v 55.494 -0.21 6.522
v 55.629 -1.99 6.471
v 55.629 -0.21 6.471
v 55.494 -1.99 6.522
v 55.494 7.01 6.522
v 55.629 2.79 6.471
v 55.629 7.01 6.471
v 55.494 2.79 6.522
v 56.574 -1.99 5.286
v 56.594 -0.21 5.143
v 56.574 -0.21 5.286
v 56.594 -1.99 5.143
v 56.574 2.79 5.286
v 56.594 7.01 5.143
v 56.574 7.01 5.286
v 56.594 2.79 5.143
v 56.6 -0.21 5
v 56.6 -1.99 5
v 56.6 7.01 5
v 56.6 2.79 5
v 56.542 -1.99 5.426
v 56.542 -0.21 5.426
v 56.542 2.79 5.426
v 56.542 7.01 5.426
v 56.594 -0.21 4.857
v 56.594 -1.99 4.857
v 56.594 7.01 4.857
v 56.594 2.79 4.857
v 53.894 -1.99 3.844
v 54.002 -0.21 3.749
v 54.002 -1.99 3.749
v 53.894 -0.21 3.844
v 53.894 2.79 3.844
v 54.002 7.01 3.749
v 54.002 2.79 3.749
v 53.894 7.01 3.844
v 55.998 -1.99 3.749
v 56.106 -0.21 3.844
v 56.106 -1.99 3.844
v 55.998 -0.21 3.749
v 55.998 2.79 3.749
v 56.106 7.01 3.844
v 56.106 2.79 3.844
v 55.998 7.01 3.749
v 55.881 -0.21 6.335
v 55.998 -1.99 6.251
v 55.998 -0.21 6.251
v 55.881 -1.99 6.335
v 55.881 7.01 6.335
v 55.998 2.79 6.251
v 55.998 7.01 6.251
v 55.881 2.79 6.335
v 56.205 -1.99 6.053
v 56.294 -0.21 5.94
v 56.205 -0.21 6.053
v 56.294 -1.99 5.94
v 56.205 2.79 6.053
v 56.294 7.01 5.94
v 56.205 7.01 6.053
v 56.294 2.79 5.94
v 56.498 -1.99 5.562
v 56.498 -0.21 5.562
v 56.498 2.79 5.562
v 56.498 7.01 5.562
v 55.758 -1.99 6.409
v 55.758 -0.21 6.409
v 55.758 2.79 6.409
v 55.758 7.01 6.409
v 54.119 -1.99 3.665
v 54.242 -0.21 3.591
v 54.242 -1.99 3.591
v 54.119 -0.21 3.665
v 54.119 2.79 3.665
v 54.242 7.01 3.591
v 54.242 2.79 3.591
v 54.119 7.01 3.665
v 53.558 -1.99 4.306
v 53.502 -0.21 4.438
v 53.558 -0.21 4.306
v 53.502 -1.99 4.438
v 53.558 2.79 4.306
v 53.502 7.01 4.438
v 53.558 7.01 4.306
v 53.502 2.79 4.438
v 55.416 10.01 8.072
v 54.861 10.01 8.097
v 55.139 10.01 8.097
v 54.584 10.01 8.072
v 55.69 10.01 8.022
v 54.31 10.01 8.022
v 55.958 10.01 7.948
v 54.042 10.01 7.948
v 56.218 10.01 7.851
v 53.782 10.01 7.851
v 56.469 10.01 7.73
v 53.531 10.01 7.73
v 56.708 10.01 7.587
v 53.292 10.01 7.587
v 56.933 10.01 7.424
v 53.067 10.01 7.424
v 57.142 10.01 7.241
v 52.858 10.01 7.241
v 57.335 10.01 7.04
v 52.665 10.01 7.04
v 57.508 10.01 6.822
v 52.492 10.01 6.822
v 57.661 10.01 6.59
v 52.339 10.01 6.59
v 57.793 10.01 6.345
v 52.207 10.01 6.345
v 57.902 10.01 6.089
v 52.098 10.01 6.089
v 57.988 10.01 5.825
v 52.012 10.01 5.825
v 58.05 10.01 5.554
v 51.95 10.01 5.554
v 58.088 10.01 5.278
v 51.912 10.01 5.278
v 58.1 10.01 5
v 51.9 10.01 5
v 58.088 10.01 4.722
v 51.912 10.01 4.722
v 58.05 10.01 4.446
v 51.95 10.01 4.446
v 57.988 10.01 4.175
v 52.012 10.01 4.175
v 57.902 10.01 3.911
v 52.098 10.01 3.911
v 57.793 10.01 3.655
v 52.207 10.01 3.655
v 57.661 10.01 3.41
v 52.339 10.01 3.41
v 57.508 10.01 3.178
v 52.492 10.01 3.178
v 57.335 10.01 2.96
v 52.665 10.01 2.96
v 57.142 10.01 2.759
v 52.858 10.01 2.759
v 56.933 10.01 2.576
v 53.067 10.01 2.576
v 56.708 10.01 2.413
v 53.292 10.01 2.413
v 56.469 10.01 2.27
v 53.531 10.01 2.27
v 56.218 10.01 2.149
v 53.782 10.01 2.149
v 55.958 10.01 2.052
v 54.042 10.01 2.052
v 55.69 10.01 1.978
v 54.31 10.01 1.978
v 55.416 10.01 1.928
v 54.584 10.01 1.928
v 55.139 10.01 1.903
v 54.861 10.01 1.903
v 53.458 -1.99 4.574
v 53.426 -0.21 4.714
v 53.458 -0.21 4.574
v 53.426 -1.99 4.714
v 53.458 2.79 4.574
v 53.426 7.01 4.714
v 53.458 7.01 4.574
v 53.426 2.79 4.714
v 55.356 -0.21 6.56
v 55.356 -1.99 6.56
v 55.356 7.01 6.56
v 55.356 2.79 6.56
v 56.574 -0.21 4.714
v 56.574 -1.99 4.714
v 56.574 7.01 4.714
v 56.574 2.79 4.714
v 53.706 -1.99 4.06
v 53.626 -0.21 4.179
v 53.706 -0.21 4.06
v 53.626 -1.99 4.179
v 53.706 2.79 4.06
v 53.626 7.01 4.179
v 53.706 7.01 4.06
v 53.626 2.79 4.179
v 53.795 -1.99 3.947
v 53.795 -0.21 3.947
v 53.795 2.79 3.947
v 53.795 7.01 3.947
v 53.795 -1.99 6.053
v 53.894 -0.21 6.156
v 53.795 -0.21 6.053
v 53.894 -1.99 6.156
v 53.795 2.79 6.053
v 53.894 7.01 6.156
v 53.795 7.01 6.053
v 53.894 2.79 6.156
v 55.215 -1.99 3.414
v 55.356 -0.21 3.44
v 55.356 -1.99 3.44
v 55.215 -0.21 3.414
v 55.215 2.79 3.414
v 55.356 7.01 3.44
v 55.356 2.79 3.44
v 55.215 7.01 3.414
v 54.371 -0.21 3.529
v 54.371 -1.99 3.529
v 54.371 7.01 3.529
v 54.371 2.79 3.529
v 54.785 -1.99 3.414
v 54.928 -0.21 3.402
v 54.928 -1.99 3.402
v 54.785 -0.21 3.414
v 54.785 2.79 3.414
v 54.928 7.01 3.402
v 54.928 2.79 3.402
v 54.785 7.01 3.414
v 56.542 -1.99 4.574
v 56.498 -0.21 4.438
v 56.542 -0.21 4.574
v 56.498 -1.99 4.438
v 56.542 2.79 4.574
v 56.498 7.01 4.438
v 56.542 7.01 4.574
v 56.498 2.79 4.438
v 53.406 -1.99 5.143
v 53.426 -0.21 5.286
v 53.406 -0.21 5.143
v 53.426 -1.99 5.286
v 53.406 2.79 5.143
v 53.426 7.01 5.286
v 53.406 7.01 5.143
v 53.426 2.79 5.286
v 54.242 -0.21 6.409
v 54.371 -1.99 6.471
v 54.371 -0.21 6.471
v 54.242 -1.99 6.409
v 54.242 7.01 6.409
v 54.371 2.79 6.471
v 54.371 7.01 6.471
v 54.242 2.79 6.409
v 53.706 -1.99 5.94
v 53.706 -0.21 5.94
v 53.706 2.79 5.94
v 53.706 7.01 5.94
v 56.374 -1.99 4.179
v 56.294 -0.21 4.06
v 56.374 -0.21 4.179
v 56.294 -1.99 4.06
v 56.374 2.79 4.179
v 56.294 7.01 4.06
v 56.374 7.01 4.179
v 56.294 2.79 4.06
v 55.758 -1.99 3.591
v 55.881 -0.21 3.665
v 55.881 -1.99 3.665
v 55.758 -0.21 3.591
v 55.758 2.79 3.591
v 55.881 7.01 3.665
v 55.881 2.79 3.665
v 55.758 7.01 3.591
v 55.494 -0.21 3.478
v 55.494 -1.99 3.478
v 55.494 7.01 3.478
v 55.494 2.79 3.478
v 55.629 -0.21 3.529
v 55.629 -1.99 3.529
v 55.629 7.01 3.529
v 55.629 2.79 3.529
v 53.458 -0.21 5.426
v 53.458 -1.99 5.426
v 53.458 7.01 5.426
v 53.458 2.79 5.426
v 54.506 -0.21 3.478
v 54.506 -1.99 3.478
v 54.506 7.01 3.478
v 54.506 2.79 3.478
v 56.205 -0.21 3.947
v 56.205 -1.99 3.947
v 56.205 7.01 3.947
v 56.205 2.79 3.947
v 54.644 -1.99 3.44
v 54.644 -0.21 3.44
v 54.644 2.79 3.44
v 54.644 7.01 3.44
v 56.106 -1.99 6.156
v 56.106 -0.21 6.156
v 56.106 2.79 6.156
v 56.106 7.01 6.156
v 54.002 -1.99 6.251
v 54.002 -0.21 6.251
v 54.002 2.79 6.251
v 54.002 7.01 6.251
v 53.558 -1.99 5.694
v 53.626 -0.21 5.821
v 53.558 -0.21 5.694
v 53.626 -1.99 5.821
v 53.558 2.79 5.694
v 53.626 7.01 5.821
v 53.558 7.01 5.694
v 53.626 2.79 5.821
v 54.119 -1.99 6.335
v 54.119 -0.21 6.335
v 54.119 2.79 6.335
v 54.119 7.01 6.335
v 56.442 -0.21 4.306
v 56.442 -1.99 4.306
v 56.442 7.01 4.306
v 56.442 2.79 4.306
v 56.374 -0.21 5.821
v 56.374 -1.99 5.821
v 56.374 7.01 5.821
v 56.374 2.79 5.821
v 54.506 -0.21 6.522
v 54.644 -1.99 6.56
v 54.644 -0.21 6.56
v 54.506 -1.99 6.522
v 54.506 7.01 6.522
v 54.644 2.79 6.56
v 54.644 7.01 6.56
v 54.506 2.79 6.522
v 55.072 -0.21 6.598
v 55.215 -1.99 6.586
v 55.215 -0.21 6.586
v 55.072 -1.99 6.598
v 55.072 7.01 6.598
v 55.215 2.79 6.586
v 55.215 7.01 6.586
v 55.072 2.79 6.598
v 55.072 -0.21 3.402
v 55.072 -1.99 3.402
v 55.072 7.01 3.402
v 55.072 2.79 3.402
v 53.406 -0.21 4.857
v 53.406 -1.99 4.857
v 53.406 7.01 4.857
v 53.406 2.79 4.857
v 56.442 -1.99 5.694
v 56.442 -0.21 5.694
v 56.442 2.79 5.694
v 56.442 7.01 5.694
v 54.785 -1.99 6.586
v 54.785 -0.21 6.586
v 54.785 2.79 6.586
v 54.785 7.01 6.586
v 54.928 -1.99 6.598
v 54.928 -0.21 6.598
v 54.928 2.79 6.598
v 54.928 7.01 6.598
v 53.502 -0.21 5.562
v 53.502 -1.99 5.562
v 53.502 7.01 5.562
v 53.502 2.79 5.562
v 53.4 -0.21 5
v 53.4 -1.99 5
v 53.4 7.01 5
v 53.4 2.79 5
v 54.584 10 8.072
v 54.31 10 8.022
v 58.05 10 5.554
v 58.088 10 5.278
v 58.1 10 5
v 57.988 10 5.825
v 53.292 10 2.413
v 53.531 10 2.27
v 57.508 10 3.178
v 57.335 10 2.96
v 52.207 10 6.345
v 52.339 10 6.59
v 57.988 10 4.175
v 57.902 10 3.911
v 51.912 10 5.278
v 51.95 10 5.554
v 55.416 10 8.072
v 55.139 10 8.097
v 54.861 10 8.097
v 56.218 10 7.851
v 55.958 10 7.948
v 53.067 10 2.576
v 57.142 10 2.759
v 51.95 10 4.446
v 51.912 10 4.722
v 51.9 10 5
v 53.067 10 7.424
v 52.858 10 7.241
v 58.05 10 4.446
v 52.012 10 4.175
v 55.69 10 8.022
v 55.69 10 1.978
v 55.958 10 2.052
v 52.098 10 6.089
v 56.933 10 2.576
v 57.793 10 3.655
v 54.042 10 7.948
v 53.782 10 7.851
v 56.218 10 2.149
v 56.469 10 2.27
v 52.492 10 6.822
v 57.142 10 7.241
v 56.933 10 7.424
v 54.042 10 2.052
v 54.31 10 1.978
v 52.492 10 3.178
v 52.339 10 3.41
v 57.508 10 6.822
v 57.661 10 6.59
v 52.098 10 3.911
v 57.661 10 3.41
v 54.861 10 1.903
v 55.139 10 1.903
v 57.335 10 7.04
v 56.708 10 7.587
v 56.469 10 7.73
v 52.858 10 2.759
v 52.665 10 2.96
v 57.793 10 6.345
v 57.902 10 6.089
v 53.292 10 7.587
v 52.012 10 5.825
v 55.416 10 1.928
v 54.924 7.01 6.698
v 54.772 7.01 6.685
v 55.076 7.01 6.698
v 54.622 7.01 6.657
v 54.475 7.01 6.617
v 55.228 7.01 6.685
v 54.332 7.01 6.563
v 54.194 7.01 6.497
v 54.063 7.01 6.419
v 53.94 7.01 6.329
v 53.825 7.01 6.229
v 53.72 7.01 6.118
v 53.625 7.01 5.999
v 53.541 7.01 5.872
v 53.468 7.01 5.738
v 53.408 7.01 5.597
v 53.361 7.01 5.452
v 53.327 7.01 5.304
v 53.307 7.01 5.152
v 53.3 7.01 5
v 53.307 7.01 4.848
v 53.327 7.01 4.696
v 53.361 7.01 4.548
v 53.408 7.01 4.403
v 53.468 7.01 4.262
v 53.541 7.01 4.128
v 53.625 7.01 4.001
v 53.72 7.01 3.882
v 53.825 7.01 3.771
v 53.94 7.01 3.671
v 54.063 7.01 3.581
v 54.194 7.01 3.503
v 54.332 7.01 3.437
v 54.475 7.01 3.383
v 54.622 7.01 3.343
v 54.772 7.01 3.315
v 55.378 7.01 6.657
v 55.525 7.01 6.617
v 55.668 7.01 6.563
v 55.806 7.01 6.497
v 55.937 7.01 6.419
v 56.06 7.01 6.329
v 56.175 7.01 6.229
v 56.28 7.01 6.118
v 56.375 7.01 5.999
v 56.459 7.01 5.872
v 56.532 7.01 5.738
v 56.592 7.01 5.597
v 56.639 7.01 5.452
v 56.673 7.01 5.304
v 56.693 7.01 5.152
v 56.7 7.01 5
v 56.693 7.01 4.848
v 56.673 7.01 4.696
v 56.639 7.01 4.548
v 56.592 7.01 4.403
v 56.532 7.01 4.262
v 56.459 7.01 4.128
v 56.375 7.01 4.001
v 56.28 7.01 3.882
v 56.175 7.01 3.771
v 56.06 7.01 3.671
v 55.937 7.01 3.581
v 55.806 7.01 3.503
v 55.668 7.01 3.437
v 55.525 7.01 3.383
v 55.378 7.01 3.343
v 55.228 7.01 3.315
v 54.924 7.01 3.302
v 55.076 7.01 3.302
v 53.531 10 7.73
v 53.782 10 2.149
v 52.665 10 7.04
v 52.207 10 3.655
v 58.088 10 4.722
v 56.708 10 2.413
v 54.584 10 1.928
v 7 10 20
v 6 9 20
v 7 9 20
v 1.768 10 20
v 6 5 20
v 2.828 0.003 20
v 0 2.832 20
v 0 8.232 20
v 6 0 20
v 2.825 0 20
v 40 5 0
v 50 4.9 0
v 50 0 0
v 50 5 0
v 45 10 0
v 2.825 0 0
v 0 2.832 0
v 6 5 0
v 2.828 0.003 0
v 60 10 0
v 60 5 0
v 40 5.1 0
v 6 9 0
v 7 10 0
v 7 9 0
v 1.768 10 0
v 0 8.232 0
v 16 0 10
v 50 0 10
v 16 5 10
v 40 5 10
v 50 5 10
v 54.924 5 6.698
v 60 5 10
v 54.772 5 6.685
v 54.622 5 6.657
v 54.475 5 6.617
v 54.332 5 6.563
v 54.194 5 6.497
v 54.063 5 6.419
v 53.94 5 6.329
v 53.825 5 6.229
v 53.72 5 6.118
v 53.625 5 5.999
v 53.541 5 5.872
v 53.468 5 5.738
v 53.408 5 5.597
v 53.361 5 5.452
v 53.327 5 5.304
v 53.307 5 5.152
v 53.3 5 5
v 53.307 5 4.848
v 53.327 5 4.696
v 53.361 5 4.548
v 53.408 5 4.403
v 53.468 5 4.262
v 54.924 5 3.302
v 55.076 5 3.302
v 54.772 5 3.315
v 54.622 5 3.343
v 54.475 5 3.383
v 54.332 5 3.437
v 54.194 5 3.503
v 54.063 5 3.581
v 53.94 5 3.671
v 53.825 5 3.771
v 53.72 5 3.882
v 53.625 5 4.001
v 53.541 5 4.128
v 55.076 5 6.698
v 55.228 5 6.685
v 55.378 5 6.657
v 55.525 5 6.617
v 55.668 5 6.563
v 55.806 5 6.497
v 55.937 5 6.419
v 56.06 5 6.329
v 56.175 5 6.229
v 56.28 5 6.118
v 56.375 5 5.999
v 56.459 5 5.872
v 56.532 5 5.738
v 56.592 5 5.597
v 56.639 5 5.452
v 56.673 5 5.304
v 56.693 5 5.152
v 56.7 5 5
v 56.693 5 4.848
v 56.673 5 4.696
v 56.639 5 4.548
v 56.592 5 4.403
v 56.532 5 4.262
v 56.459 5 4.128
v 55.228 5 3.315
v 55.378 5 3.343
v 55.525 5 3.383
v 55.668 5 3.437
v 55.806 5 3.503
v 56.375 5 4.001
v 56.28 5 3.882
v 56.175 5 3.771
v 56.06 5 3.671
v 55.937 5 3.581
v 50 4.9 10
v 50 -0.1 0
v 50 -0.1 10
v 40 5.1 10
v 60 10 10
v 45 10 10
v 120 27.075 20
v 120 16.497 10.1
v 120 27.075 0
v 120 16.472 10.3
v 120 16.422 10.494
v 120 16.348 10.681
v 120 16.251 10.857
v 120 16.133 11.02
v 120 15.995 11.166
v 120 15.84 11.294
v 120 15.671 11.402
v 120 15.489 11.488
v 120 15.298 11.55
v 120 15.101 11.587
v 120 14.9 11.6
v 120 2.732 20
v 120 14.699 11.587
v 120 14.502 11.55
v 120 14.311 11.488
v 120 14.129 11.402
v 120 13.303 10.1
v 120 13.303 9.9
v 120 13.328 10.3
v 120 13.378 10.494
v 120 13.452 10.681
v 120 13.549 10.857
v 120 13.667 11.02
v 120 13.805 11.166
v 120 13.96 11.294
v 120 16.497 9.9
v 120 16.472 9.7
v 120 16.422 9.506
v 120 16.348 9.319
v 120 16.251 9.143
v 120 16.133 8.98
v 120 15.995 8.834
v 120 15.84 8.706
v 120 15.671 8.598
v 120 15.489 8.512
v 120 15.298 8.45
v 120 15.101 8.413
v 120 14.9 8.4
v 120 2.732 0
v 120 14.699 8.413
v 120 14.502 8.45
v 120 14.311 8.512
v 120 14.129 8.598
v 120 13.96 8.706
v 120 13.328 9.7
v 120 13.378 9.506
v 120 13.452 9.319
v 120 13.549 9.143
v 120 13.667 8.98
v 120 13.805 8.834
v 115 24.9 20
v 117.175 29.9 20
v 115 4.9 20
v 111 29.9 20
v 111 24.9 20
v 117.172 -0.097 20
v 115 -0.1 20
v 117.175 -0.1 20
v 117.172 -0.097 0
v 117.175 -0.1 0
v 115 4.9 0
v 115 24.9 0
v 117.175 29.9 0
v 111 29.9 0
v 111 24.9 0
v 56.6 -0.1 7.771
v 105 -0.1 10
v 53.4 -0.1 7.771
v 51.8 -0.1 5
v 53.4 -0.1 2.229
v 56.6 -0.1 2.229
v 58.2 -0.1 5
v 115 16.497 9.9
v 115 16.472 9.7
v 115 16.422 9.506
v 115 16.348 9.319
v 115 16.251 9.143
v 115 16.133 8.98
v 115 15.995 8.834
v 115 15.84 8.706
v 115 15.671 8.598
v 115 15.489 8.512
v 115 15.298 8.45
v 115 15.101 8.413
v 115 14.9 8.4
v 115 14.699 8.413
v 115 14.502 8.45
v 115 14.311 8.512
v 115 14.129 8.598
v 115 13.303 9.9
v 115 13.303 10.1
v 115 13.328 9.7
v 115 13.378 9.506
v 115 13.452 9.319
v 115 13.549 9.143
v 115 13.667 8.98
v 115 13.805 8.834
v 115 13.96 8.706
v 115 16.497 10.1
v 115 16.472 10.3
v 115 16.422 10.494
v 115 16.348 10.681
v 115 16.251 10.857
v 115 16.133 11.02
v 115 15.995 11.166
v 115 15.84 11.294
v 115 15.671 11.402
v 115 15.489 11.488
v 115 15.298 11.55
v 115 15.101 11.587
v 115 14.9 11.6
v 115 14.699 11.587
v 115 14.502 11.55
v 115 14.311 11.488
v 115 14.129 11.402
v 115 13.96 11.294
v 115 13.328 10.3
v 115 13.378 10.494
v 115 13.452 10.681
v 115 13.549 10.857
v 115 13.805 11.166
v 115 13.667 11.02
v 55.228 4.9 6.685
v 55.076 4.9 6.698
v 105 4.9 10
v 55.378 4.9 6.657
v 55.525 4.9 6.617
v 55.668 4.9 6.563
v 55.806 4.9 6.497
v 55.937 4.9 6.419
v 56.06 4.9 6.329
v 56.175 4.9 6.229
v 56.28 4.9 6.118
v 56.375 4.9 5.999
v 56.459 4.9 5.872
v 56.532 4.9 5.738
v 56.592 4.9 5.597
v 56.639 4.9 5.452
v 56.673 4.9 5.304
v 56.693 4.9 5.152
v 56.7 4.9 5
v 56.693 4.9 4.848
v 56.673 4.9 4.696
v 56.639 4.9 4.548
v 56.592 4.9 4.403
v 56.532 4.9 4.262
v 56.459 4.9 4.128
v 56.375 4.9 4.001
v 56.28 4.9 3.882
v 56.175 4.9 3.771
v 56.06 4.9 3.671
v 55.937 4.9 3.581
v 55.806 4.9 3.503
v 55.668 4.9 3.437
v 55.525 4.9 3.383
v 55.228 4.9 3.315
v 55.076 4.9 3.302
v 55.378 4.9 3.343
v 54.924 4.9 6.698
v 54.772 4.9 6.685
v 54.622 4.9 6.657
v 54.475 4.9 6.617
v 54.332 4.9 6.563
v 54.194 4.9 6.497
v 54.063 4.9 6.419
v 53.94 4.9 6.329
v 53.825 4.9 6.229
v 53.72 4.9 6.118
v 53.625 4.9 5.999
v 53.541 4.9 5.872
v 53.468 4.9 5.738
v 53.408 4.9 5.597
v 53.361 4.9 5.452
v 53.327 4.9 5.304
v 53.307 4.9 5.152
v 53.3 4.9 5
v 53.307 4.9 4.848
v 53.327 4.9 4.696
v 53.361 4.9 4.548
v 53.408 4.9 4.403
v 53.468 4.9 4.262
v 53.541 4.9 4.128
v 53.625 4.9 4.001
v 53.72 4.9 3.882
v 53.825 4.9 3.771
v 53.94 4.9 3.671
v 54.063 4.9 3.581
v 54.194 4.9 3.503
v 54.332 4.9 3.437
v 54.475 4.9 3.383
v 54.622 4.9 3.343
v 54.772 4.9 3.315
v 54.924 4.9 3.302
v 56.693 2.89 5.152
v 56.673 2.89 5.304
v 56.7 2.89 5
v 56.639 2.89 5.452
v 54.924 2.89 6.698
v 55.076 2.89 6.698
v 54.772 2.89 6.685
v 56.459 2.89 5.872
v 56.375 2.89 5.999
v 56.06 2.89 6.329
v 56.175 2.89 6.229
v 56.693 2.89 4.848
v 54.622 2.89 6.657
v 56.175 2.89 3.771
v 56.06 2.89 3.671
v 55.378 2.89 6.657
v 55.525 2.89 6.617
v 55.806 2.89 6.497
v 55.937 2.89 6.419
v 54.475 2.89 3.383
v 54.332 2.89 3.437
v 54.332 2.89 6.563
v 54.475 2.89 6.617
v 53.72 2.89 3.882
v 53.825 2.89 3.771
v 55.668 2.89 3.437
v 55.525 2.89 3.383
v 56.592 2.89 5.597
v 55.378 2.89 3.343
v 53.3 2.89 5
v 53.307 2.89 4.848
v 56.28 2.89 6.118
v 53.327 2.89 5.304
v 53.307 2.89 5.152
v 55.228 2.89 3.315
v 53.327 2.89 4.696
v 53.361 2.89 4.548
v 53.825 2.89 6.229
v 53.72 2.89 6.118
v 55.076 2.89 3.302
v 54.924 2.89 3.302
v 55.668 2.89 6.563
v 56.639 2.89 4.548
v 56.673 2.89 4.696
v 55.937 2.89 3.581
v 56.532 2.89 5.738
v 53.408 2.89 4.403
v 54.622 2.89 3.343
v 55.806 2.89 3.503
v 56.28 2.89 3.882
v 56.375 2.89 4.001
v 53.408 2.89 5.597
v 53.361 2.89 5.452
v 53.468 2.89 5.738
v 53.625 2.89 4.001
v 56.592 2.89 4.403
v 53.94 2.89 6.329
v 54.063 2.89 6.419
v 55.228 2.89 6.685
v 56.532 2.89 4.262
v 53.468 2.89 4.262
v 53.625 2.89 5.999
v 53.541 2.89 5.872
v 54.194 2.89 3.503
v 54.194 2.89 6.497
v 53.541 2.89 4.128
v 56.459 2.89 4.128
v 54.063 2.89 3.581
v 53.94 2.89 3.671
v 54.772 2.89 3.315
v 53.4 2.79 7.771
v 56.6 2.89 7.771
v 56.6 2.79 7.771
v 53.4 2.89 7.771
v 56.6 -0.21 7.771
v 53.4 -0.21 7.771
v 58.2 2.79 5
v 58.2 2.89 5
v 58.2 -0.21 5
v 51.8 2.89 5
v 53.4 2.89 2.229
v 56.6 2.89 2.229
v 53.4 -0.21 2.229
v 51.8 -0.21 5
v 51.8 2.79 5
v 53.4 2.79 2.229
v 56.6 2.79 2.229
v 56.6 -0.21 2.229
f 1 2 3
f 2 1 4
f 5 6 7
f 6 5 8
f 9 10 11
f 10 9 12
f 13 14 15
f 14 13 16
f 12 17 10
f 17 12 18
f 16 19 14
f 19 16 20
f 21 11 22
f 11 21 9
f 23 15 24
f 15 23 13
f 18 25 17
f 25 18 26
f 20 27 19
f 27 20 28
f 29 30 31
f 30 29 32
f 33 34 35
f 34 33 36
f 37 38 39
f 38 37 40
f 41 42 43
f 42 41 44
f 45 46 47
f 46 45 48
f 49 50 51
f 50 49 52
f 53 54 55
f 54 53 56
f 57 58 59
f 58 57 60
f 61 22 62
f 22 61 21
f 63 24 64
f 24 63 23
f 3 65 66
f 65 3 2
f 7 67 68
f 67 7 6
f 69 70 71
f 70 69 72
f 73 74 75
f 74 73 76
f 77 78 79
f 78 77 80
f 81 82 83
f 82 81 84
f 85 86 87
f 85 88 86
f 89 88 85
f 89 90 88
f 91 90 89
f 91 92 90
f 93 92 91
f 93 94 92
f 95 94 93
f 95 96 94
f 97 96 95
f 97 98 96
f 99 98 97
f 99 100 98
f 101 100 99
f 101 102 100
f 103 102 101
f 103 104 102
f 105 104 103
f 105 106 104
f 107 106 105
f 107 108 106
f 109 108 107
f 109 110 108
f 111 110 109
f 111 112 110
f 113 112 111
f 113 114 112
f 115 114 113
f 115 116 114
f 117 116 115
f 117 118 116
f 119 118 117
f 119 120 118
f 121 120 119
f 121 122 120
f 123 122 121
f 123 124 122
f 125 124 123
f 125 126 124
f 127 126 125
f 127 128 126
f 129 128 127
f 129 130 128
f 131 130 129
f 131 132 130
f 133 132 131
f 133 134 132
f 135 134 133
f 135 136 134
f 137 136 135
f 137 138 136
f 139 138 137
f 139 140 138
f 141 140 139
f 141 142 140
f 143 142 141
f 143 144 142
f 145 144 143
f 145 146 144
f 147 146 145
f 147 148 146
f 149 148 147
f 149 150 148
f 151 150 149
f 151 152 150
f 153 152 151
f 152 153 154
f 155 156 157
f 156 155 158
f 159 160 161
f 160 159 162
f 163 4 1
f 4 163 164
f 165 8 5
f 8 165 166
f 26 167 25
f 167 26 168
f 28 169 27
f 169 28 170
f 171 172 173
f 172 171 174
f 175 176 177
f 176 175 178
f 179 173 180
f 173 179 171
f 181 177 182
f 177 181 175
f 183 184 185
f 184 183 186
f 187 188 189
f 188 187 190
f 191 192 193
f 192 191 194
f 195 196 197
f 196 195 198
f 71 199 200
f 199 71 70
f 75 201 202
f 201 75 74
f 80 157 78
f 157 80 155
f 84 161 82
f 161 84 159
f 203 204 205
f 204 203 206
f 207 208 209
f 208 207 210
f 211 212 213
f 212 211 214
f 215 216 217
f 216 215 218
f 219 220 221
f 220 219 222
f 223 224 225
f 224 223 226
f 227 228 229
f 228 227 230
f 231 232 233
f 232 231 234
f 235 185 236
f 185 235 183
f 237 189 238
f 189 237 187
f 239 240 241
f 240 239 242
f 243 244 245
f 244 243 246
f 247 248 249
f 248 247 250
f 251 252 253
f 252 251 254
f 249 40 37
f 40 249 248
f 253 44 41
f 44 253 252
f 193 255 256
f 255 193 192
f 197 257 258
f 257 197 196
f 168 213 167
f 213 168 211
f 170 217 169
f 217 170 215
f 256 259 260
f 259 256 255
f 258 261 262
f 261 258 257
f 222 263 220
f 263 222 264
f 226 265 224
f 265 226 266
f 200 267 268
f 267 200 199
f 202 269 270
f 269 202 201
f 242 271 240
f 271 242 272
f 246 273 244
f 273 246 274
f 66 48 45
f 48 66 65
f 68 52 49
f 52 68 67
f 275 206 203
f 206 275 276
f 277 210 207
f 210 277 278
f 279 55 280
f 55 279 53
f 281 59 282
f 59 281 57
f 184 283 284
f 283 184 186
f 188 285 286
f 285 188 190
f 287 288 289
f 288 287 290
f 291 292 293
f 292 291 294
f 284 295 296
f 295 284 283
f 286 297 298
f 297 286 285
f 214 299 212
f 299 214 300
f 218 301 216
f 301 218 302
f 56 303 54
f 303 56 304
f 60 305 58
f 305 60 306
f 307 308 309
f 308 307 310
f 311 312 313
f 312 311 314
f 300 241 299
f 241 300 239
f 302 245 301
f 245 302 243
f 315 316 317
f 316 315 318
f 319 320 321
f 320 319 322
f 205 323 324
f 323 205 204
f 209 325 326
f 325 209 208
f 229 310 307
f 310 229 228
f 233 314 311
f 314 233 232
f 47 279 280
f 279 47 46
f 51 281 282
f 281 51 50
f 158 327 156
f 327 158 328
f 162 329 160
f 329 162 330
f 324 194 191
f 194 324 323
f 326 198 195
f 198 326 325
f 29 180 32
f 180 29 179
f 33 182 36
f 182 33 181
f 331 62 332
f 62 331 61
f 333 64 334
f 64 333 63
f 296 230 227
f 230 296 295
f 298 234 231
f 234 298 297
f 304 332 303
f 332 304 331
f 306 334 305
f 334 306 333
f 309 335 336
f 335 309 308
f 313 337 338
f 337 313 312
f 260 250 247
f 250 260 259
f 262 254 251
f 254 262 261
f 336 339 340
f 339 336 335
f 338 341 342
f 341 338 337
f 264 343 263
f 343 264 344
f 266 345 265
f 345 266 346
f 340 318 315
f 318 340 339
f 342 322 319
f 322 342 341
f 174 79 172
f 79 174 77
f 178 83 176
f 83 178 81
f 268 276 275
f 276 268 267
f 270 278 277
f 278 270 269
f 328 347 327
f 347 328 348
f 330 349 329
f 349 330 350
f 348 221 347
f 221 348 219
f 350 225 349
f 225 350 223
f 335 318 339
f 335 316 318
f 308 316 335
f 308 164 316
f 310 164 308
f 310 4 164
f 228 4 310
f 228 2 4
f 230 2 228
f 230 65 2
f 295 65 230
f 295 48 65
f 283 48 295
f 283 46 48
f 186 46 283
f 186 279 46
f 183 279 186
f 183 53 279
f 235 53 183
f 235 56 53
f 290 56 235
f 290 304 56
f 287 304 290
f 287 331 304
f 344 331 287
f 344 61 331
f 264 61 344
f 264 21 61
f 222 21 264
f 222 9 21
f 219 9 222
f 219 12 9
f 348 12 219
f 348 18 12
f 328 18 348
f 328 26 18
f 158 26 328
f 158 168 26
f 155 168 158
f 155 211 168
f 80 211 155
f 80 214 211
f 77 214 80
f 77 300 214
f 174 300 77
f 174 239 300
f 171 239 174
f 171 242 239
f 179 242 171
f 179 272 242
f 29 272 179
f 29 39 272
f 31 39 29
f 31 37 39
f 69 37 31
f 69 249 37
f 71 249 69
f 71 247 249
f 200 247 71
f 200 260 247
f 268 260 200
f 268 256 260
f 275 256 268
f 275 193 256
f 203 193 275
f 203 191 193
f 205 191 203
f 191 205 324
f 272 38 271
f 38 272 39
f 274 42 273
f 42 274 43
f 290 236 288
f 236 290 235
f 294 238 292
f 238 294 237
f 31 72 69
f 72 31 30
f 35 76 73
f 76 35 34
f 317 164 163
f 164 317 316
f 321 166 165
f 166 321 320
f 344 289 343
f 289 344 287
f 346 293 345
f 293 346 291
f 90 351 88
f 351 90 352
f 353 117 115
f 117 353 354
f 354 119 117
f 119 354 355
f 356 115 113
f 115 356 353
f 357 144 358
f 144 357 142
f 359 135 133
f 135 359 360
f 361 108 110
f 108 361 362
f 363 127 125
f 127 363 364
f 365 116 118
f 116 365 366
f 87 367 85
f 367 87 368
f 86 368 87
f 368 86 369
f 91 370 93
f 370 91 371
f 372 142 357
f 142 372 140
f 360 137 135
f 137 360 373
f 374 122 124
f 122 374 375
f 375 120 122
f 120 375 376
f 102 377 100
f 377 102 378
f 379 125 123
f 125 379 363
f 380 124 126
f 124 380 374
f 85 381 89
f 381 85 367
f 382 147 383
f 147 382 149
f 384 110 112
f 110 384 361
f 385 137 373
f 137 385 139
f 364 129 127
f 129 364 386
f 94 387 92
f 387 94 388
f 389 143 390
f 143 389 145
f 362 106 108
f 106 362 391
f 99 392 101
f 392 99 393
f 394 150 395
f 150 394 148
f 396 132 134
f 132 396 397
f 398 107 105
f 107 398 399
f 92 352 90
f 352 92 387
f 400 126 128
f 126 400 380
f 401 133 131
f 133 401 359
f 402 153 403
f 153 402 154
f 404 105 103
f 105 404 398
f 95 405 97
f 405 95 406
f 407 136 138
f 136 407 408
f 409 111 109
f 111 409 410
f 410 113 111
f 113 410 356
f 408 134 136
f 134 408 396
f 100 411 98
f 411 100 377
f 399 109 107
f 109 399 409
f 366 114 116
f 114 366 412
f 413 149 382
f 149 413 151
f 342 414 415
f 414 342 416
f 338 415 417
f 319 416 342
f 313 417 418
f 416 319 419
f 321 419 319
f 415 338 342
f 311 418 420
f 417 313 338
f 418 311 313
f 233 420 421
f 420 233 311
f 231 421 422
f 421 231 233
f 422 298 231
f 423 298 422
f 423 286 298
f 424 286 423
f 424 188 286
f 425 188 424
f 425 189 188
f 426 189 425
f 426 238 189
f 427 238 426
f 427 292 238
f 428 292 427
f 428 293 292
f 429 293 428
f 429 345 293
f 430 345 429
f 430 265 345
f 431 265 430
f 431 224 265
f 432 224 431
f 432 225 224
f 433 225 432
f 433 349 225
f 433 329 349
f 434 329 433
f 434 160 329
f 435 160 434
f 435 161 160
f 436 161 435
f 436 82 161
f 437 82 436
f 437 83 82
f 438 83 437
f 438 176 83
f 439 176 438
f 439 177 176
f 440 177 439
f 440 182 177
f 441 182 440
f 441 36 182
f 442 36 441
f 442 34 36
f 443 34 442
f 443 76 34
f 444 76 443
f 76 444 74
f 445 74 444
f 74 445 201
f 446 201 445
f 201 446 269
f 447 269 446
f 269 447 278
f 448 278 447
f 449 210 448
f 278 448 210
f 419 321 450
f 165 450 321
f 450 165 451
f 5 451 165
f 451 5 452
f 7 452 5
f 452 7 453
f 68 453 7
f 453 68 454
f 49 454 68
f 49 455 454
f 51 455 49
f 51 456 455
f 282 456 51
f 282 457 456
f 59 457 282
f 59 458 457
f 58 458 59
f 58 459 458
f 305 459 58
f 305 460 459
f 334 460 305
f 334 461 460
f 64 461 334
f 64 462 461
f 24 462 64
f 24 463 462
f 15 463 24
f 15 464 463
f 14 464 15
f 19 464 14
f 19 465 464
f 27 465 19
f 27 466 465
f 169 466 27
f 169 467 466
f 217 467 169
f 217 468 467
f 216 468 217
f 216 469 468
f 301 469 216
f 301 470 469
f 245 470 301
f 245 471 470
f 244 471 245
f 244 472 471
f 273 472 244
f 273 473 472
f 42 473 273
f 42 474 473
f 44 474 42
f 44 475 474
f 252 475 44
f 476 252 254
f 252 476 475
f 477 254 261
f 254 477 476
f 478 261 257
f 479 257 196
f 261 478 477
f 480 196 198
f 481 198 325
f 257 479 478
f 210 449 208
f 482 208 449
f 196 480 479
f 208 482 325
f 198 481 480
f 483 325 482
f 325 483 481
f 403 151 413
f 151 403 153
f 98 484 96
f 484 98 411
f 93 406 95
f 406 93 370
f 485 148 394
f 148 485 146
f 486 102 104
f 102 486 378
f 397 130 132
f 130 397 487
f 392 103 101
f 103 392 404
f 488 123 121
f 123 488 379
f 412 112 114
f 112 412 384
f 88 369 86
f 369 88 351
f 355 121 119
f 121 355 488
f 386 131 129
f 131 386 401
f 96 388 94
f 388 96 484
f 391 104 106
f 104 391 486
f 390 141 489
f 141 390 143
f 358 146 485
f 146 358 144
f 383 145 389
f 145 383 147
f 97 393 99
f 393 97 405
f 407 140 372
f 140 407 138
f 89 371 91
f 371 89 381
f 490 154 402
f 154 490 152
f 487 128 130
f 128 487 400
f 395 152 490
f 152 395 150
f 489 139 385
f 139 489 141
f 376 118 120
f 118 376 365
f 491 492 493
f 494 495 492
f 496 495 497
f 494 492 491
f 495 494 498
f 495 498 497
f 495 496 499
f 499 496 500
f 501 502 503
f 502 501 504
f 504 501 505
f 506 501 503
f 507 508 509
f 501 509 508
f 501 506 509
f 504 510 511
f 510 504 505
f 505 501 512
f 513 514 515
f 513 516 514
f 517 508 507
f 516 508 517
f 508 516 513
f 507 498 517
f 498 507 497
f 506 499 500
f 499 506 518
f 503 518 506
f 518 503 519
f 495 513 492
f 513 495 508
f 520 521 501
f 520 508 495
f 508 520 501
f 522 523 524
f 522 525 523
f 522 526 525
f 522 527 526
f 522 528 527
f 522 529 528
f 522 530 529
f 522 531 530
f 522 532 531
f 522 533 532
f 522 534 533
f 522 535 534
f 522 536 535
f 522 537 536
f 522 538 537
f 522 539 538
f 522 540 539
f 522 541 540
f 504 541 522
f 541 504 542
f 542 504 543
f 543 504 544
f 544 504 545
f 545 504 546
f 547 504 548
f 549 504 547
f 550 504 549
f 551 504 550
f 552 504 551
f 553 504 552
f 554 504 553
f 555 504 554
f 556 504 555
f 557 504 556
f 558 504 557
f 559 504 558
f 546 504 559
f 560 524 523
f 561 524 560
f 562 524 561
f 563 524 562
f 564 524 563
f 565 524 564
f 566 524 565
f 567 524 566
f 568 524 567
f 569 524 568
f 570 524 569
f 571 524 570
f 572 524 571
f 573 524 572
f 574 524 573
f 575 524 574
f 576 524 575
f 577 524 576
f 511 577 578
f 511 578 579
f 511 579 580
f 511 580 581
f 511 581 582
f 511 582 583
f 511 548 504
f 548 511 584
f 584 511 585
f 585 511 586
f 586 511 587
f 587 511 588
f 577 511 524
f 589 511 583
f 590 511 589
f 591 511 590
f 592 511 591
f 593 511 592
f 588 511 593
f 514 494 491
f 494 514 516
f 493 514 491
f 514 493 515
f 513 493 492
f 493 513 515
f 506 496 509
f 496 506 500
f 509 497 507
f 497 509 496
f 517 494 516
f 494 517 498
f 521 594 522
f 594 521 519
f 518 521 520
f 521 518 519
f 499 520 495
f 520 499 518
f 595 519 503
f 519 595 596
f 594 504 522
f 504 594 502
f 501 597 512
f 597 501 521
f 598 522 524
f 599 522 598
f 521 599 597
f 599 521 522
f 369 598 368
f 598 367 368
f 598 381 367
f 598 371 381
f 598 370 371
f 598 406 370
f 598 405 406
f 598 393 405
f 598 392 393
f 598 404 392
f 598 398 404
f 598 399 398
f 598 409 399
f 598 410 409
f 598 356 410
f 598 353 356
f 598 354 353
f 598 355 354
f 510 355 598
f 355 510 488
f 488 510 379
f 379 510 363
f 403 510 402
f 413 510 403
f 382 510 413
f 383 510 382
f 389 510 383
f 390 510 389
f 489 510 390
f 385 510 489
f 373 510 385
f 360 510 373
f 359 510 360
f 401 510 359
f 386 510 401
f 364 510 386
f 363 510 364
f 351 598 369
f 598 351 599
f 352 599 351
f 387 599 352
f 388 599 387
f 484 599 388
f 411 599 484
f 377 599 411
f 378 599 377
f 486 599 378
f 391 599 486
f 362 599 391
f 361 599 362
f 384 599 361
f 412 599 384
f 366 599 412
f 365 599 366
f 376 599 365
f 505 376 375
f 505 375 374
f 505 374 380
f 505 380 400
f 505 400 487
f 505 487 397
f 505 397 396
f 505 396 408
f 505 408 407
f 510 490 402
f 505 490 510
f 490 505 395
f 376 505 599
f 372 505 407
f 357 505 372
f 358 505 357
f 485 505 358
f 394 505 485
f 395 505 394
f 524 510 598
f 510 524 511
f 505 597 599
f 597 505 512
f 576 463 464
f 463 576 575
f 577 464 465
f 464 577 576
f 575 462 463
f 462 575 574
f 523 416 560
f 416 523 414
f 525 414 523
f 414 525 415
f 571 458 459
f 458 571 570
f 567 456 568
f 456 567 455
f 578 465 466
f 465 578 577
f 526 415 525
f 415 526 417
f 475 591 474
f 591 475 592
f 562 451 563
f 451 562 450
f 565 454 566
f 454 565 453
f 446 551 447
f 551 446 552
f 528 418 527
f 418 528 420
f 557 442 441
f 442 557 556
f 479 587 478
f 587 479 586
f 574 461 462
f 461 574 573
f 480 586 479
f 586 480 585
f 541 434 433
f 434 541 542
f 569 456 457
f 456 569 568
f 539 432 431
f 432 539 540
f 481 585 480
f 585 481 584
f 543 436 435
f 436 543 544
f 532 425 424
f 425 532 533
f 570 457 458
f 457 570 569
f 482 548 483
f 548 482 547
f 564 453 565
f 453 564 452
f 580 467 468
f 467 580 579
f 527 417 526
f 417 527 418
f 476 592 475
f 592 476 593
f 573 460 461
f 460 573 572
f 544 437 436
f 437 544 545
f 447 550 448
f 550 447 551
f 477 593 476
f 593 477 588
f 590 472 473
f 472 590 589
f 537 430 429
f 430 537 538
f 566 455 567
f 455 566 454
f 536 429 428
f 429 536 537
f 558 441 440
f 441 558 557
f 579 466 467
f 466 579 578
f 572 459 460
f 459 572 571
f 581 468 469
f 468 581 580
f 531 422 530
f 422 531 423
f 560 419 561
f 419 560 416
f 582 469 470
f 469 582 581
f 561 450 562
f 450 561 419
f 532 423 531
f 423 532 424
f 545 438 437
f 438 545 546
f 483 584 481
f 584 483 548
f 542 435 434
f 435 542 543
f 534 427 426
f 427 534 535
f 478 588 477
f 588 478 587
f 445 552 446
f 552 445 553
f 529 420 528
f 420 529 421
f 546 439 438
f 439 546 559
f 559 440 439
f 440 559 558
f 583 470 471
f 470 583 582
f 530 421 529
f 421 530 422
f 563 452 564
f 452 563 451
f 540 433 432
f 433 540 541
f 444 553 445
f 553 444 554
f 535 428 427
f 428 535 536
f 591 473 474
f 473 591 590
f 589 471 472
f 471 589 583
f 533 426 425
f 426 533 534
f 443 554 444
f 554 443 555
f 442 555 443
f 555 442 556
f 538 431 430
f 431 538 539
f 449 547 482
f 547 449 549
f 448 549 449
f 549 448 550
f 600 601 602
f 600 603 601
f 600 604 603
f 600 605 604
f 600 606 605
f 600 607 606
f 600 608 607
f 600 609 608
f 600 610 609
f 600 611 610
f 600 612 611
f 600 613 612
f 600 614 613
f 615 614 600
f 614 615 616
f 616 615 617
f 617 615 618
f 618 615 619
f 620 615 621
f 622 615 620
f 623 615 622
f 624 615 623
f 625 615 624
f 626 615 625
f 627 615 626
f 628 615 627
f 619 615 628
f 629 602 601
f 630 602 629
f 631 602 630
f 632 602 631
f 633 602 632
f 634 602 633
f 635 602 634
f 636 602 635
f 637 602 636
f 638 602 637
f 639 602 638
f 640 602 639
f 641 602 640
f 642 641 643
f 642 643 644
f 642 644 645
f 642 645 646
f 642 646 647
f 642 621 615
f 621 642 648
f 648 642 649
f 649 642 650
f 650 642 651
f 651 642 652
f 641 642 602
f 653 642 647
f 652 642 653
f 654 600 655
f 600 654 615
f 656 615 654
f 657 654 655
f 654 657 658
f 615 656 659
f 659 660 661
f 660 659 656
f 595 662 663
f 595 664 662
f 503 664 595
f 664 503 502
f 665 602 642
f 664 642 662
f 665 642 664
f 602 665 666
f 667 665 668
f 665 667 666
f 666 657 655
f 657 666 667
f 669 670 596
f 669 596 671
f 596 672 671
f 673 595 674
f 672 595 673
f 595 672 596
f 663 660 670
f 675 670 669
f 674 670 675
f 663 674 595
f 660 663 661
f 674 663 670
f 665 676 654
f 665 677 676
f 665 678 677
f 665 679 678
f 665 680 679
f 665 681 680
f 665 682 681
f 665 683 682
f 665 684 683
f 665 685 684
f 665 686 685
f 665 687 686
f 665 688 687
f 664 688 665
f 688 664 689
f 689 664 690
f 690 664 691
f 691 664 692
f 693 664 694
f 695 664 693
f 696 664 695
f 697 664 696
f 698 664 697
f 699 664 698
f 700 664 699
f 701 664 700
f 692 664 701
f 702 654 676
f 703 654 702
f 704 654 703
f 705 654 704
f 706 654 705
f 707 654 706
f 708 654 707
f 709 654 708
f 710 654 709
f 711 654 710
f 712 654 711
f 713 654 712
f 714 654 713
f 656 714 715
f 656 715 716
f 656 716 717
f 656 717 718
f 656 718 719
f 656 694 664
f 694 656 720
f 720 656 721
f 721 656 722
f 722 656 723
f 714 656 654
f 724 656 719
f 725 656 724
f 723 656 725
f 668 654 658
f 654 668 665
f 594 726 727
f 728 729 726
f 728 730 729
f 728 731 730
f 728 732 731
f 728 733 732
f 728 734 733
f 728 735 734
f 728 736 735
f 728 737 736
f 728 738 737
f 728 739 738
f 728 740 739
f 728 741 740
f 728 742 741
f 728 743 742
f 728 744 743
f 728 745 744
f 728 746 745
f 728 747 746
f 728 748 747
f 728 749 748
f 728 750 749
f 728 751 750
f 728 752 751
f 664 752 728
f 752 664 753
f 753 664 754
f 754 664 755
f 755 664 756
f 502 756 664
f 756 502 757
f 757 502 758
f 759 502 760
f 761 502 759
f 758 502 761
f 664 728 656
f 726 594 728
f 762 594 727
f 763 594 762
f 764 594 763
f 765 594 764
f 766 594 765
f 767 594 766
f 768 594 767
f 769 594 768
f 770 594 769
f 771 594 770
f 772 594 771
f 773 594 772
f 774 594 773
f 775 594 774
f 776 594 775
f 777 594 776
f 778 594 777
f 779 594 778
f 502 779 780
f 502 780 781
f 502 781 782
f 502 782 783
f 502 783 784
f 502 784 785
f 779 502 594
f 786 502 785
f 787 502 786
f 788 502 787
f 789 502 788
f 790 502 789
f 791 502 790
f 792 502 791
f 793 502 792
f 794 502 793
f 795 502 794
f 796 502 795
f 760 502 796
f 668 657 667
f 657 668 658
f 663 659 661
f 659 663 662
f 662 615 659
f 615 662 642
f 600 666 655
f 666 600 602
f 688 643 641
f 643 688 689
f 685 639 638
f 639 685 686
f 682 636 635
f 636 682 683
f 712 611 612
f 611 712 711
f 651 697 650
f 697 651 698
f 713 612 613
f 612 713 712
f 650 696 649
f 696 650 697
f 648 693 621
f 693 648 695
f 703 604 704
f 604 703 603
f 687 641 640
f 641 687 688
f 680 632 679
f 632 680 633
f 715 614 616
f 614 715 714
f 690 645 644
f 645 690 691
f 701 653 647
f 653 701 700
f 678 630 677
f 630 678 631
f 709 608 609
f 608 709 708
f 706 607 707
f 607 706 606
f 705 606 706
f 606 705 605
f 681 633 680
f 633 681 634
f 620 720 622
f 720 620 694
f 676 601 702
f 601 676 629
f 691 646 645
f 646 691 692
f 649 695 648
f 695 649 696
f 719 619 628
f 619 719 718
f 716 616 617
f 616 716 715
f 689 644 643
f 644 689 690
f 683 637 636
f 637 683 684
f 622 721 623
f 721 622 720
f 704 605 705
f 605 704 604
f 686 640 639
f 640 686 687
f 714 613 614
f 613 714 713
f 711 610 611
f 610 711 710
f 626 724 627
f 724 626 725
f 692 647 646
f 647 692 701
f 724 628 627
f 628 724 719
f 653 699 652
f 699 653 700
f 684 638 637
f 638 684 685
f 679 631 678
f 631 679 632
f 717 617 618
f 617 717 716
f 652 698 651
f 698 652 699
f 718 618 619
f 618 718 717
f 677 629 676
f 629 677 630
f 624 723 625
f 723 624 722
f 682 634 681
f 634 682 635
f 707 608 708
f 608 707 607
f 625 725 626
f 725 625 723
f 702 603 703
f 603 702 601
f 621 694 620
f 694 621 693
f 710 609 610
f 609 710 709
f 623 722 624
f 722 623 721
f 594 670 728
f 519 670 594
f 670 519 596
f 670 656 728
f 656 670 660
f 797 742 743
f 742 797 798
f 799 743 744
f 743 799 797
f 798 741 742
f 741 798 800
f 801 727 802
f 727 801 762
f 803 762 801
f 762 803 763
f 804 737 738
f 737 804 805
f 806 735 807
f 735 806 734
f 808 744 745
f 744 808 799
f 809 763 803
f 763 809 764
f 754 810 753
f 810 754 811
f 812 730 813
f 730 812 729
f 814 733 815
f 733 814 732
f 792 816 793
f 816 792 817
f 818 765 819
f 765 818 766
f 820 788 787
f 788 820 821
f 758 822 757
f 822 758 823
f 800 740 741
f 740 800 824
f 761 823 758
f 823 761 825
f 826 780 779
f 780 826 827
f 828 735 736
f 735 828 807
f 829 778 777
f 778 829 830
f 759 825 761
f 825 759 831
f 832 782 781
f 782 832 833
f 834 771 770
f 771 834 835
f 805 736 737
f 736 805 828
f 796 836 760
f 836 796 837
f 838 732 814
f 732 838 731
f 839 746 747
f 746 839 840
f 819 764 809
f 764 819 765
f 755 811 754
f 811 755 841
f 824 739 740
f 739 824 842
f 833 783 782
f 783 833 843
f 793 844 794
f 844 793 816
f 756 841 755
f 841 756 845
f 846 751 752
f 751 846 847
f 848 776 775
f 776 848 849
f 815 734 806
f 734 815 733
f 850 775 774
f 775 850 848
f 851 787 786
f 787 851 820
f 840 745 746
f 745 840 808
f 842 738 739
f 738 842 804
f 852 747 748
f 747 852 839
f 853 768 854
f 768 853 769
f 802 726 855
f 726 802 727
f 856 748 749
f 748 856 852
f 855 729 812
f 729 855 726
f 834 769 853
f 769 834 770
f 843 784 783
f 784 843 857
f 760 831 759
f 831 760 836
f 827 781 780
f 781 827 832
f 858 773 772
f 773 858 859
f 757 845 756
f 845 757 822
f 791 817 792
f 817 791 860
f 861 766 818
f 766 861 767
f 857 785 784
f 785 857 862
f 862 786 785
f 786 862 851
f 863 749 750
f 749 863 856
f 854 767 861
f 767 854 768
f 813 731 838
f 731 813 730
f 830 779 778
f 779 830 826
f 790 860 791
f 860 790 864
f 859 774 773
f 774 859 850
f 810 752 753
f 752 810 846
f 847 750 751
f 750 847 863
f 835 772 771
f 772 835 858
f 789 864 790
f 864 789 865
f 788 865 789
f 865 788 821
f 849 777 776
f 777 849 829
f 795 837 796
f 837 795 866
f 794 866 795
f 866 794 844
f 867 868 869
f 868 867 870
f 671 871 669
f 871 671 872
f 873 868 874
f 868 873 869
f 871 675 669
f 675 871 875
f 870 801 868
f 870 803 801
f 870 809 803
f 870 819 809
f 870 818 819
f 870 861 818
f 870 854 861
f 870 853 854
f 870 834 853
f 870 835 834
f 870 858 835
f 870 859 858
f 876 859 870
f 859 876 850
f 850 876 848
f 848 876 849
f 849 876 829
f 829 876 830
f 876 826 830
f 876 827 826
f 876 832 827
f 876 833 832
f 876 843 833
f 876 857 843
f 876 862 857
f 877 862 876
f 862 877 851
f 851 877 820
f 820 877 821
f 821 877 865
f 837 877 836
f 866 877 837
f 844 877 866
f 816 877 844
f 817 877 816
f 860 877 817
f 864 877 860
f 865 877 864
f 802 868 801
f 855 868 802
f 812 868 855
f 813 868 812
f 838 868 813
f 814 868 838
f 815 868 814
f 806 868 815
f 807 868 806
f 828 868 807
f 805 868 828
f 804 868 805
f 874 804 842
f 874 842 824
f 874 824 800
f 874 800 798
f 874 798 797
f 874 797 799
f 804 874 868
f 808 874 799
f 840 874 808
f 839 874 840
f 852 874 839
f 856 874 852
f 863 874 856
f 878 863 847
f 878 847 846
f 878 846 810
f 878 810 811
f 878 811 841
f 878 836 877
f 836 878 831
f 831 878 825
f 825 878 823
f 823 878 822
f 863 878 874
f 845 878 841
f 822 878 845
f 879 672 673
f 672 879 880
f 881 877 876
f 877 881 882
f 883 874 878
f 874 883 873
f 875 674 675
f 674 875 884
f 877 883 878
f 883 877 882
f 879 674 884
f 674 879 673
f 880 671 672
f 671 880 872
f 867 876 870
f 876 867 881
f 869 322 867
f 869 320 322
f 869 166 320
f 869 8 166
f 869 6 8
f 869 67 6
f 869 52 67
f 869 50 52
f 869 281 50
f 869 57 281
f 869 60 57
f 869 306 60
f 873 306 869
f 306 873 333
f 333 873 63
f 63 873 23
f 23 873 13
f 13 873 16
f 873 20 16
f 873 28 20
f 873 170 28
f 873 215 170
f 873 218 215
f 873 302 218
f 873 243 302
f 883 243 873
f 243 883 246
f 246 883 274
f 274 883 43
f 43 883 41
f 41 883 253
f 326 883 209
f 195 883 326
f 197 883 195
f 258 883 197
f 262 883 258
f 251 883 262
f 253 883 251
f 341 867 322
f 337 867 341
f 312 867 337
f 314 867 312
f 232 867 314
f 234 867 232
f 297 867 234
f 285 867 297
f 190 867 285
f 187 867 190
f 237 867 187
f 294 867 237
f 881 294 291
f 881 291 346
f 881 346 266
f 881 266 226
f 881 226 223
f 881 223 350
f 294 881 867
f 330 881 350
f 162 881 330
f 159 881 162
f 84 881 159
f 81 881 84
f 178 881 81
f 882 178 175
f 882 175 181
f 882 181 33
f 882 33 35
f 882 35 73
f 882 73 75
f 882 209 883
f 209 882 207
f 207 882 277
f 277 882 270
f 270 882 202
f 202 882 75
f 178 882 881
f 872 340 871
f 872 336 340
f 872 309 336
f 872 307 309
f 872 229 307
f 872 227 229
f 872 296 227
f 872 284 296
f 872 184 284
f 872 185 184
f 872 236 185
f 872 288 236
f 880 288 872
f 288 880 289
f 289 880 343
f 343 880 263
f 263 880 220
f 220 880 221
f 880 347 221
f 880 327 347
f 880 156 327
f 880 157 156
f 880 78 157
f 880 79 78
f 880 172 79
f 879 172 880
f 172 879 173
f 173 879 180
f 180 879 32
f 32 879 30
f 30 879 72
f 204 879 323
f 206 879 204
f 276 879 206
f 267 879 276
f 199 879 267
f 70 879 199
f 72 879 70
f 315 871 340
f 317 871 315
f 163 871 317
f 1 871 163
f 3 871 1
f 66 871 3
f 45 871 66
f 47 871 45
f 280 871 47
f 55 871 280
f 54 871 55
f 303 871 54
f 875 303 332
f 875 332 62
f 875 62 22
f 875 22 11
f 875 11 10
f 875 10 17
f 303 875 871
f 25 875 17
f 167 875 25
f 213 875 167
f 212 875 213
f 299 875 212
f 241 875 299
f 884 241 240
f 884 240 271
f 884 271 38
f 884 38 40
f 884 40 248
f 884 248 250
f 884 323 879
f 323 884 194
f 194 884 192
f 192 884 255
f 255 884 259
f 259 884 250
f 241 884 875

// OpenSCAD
/* gantry-installation-hook.scad
Author: andimoto@posteo.de
----------------------------
for holding gantry ov voron 2.4 at installation into frame.

*/
$fn=70;

extra = 0.01;

filamentDia=1.75;


module hanger(){
  difference() {
    cube([120,30,20]);

    translate([6,5,-0.1]) cube([109,20,21]);
    translate([6,5,-.10]) cube([105,30,21]);
    translate([-extra,10,-0.1]) cube([6+extra*2,30,21]);
  }
  translate([0,9,0]) cube([7,1,20]);
}


module voronGantryHook()
{
  difference() {
    hanger();
    /* champfers */
    translate([0,-5.65/2,-extra]) rotate([0,0,45]) cube([4,4,20+extra*2]);
    translate([120,-5.65/2,-extra]) rotate([0,0,45]) cube([4,4,20+extra*2]);
    translate([120,30-5.65/2,-extra]) rotate([0,0,45]) cube([4,4,20+extra*2]);
    translate([0,10-sqrt(2.5^2*2)/2,-extra]) rotate([0,0,45]) cube([2.5,2.5,20+extra*2]);

    /* holes for extrusions */
    translate([115,15,10]) rotate([0,90,0]) cylinder(r=3.2/2,h=10,$fn=50);

    /* cutout */
    translate([16,-extra,10]) cube([89,5+extra*2,10+extra]);
    translate([6,-extra,20]) rotate([0,45,0]) cube([sqrt(10^2*2),5+extra*2,sqrt(10^2*2)]);
    translate([95,-extra,20]) rotate([0,45,0]) cube([sqrt(10^2*2),5+extra*2,sqrt(10^2*2)]);
  }
}

module screw(dia=3,lenght=25)
{
  cylinder(r=dia/2,h=lenght);
  cylinder(r=6.2/2,h=3);
}

module nut()
{
cylinder(r=6/2 + 0.2, h=3, $fn=6);
}
/* nut(); */

module hookPart1()
{
  difference()
  {
    union()
    {
      difference()
      {
        voronGantryHook();
        translate([50,-extra,-extra]) cube([70+extra,30+extra*2,20+extra*2]);
      }
      hull()
      {
        translate([40,5,0])
        cube([20,0.1,10]);
        translate([45,5+5-0.1,0])
        cube([15,0.1,10]);
      }
    }

    translate([50+5,10+extra,5])
    rotate([90,0,0]) screw(dia=3.4);
  }
}

module hookPart2()
{
  difference()
  {
    voronGantryHook();
    translate([-extra,-extra,-extra]) cube([50+extra,30+extra*2,20+extra*2]);

    translate([50+5,10+extra,5])
    rotate([90,0,0]) screw(dia=3.4);

    translate([50+5,3-extra,5])
    rotate([90,0,0]) nut();
  }
}

color("silver")
translate([50+5,3-extra-0.2,5])
rotate([90,0,0]) nut();

color("silver")
translate([50+5,10+extra,5])
rotate([90,0,0]) screw(dia=3.2,lenght=12);

hookPart1();
translate([0,-0.1,0])
hookPart2();
